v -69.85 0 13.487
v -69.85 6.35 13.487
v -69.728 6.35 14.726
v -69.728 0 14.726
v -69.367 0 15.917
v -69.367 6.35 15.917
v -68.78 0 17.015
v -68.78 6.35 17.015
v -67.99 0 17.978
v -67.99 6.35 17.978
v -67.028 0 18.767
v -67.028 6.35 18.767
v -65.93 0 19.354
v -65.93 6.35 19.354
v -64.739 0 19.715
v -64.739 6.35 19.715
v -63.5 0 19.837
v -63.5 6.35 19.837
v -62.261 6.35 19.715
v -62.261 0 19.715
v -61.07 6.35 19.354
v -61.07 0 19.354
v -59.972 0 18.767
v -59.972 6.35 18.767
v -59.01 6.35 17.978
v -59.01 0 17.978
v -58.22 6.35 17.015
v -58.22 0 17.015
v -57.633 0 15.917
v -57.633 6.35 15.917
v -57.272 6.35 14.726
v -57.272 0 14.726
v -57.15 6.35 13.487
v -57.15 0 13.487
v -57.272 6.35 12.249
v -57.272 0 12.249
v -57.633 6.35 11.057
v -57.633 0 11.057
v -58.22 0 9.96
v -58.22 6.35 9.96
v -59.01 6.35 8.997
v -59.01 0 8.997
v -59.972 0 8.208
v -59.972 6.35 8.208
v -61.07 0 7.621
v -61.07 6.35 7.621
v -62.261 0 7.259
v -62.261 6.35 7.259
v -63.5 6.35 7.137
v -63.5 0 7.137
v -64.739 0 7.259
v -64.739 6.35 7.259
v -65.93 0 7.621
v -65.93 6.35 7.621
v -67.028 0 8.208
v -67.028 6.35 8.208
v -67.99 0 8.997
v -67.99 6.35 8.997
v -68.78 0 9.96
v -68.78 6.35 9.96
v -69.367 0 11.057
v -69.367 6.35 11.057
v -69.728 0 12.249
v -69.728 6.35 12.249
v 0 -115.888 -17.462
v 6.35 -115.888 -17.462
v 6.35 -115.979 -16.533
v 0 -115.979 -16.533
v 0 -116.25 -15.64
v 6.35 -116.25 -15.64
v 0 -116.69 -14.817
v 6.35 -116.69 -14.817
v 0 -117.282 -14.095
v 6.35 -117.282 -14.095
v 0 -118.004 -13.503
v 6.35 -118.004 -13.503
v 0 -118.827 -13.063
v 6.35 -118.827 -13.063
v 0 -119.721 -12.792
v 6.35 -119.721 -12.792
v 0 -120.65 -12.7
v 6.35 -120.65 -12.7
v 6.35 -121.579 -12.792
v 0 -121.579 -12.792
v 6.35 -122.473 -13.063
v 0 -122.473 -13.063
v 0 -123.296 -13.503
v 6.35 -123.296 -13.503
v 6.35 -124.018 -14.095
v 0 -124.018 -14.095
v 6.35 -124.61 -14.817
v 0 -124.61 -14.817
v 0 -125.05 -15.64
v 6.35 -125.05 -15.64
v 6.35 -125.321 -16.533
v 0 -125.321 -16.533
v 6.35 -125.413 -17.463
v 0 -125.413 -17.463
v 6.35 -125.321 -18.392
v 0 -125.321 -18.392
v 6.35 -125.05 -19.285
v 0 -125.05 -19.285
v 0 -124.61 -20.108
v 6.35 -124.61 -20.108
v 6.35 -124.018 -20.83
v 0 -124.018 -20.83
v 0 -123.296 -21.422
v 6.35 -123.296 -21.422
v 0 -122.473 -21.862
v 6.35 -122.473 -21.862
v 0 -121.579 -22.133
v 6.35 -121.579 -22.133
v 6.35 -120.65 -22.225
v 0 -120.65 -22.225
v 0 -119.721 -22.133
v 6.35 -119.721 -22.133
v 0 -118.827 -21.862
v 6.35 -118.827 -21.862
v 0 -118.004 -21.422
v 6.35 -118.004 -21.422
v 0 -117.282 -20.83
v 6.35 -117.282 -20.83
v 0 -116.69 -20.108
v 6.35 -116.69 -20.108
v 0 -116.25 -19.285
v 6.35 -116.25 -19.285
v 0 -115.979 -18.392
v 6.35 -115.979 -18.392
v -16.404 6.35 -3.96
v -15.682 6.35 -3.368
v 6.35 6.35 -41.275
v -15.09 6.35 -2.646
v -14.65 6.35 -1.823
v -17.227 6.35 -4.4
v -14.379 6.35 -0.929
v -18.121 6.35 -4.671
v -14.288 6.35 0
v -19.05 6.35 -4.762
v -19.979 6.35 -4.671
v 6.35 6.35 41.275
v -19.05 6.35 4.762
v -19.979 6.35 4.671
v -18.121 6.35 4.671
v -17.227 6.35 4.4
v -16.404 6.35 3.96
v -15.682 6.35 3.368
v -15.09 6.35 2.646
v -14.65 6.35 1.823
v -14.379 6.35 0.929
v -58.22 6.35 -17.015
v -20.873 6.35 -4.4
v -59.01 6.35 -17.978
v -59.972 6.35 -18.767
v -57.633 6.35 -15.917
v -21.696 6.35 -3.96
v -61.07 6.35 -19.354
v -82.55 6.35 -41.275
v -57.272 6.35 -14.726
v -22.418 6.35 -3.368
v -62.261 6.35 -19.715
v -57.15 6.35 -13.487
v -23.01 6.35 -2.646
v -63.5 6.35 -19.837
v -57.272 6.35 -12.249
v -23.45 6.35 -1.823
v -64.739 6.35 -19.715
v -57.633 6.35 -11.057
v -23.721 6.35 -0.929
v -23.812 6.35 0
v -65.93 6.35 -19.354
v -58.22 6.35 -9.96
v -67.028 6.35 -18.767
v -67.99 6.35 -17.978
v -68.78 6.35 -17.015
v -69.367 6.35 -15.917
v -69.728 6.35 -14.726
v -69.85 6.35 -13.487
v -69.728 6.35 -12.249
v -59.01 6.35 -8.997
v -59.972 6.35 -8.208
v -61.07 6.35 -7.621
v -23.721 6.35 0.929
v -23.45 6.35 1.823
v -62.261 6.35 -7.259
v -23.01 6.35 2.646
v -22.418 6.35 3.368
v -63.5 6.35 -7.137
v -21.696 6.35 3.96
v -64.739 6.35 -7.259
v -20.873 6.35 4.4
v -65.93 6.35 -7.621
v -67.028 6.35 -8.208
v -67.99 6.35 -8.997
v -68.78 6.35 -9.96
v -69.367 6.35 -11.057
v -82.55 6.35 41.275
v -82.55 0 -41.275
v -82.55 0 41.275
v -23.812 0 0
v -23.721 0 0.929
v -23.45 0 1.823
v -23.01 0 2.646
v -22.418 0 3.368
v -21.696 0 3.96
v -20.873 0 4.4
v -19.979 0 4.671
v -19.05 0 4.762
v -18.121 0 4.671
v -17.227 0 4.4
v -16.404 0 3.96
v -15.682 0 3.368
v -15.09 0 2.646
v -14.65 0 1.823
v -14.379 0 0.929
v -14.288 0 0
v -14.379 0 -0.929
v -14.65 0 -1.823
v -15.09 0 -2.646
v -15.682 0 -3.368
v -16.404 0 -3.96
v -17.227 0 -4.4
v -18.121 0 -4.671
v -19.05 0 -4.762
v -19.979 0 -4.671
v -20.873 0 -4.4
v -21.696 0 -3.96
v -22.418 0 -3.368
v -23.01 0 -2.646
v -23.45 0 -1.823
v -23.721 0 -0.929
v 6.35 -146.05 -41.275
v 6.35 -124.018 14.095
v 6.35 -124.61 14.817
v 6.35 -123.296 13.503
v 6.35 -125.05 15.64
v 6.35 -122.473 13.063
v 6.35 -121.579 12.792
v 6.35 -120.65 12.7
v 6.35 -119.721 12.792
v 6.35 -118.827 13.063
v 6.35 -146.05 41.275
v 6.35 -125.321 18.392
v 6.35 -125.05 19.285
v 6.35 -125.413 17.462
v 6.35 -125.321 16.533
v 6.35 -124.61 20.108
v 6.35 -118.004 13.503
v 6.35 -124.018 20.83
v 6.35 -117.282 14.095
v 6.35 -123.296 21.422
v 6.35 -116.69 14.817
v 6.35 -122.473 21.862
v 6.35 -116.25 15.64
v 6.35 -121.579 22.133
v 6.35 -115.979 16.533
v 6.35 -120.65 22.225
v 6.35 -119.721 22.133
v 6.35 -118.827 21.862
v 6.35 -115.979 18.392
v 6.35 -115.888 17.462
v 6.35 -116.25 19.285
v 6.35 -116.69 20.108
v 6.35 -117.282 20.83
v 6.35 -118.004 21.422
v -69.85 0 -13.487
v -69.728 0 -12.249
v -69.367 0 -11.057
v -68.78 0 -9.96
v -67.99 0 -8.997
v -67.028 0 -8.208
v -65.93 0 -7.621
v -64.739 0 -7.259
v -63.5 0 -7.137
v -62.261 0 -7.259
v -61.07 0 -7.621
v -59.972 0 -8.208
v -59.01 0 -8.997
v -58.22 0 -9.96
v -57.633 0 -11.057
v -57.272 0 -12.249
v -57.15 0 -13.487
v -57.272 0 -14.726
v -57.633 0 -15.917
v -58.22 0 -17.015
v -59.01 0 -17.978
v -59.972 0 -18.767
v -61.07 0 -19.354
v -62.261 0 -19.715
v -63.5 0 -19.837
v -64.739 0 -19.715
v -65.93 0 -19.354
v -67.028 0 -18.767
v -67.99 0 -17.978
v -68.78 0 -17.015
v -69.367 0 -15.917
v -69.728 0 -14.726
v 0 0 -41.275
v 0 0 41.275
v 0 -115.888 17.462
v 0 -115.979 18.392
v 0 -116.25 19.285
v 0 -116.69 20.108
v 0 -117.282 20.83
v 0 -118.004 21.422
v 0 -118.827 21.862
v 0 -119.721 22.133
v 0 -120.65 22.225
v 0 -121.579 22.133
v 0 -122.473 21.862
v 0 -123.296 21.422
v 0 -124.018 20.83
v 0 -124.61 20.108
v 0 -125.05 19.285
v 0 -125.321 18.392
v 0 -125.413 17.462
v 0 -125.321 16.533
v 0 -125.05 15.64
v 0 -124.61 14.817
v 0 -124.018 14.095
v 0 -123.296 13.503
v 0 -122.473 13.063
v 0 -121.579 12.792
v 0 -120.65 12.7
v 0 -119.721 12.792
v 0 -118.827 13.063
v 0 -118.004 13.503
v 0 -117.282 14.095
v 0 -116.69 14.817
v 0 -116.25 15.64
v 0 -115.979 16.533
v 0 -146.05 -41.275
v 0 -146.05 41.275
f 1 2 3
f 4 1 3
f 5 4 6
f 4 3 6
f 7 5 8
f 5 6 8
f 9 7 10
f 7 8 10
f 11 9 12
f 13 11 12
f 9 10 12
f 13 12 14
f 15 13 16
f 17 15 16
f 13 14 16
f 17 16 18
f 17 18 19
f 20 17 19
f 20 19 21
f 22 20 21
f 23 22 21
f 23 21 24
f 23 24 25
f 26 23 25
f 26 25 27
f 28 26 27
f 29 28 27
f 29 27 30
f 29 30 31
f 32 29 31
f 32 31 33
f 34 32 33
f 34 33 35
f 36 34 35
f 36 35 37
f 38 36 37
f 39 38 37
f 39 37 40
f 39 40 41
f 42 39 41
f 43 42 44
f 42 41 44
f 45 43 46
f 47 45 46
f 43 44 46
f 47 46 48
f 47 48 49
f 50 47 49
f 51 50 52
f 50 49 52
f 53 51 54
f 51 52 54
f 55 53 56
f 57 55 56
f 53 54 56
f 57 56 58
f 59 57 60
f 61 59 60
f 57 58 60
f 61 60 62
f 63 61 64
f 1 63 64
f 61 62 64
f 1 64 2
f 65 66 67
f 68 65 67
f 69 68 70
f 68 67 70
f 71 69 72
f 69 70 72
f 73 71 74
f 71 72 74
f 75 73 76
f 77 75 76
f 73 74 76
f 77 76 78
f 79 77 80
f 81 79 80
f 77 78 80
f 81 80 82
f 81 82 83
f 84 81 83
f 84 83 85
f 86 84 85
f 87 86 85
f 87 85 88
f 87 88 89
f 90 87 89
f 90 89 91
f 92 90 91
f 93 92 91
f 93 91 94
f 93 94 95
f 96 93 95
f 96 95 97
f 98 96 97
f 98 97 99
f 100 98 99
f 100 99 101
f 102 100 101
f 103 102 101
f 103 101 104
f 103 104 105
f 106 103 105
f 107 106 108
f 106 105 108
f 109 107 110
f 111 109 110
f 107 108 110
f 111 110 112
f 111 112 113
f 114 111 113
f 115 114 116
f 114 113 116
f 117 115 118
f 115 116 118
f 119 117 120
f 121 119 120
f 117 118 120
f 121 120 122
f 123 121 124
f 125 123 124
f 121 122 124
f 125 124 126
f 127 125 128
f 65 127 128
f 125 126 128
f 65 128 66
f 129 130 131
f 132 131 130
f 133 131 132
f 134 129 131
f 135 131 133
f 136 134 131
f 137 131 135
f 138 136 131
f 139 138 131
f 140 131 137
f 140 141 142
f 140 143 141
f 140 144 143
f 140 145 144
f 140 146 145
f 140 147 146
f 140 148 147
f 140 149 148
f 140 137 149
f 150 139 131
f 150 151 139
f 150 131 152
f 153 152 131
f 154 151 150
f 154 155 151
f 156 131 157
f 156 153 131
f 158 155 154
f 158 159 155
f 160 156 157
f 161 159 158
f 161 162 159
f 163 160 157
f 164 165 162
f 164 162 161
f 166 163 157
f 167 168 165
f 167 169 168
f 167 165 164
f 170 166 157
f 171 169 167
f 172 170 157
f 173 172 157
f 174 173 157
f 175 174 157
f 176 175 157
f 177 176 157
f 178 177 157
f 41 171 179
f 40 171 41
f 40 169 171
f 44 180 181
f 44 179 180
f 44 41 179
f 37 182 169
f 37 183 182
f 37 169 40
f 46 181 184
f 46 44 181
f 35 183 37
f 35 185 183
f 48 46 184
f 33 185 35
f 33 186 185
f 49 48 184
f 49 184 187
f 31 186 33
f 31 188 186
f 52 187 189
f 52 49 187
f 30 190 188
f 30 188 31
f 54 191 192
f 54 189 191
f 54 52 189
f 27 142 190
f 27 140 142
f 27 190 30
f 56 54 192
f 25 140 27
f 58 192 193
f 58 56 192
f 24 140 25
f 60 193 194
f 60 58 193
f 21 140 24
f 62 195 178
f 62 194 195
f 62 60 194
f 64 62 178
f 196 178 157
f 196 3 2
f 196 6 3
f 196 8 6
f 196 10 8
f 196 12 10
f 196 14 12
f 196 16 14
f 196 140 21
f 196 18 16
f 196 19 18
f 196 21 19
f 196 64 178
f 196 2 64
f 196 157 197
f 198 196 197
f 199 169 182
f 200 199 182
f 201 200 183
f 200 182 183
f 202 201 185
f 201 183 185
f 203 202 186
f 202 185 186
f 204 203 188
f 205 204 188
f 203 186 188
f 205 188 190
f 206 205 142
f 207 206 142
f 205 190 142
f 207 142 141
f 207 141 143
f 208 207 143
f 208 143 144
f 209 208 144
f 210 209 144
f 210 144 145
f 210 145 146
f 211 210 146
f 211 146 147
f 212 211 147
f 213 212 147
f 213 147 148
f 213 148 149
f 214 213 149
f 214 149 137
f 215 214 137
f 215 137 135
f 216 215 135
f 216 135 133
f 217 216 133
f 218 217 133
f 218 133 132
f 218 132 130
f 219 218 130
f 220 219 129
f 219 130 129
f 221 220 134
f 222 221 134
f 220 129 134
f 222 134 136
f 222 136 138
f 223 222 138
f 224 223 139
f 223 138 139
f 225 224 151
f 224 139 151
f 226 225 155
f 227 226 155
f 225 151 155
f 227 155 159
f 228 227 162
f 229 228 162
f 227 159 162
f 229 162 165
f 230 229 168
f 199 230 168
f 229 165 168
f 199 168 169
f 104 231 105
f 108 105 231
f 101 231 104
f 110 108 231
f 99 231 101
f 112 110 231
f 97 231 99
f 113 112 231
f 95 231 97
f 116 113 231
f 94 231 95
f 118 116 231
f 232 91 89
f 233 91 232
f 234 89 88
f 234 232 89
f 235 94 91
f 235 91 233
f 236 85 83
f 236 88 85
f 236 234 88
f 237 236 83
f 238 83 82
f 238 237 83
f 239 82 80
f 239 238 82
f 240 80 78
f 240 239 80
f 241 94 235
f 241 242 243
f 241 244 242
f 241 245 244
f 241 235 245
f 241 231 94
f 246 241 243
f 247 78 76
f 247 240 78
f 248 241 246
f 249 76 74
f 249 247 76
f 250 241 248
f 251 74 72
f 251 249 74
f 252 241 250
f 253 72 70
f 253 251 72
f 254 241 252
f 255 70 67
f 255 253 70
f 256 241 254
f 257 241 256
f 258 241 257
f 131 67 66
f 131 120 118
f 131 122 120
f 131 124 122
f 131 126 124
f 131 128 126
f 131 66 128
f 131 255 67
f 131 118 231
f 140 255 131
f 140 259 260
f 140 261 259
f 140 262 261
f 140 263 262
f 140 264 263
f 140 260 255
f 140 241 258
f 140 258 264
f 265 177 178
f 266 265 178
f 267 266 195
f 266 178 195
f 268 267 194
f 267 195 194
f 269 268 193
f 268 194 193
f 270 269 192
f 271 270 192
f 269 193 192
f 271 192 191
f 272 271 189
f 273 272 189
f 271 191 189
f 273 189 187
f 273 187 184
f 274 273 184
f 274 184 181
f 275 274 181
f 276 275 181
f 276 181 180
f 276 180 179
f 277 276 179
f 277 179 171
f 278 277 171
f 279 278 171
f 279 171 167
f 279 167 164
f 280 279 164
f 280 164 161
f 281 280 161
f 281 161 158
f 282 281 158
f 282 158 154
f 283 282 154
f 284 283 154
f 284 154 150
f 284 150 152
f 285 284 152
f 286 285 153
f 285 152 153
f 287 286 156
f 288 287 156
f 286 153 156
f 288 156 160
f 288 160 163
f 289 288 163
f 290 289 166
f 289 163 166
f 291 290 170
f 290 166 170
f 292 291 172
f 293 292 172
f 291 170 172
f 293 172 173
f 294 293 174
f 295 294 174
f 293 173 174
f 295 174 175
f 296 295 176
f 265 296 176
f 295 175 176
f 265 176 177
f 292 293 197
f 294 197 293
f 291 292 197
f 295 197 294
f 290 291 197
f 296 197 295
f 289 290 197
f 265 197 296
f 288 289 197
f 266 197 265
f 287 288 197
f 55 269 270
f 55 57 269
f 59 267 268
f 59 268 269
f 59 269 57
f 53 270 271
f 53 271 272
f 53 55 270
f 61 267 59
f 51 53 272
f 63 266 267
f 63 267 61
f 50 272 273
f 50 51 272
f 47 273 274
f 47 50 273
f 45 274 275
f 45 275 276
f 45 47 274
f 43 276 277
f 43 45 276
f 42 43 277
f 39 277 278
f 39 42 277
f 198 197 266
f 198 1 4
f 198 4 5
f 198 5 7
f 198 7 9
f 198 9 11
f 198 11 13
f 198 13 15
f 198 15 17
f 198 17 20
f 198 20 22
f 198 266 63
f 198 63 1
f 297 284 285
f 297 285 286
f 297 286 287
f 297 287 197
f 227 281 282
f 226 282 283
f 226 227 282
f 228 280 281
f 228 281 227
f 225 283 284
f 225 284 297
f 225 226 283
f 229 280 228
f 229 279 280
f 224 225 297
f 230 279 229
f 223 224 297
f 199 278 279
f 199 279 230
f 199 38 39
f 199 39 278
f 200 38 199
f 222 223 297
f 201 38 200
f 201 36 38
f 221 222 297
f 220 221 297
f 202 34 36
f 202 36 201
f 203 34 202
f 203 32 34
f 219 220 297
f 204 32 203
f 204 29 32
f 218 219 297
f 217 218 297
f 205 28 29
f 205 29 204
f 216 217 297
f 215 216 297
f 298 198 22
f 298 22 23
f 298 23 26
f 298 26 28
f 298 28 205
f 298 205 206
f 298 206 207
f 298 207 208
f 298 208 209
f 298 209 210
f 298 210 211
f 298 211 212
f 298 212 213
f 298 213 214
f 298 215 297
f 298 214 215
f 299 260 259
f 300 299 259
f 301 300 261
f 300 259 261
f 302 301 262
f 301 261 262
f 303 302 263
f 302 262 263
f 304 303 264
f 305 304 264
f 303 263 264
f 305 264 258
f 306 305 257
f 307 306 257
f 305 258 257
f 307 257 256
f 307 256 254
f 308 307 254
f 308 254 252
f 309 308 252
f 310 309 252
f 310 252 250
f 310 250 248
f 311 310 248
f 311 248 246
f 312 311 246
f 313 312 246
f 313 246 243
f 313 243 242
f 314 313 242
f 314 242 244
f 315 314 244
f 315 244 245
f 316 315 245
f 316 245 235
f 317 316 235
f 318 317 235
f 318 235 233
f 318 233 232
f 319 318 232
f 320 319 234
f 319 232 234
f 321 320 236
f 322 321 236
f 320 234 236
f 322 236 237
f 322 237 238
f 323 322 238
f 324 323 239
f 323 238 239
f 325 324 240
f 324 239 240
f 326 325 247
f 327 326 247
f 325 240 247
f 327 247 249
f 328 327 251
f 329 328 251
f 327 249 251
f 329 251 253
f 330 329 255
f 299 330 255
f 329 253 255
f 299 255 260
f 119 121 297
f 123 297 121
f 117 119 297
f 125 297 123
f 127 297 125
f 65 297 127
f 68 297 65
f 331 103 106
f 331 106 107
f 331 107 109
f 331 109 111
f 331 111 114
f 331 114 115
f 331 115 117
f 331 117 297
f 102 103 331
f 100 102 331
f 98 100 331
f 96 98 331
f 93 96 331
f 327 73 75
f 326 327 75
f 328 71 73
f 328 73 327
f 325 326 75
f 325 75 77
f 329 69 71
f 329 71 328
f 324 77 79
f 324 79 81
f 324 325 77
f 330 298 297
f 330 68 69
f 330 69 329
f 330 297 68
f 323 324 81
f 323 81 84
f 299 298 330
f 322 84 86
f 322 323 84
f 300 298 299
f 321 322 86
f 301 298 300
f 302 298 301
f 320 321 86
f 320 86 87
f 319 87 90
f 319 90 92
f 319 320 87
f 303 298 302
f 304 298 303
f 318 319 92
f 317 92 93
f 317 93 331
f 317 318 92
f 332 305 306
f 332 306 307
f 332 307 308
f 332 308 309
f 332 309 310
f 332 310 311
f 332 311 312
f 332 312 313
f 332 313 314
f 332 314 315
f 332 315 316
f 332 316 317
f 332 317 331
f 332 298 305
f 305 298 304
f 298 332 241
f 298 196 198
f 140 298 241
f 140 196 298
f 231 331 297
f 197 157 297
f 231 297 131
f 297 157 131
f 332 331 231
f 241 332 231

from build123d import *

# Parameters (mm, degrees)
F1_DEPTH = 41.275
F2_R     = 4.7625
F3_DEPTH = 88.901
F4_R     = 6.35
F4_R_2   = 4.7625
F5_DEPTH = 152.401


with BuildPart() as f1:
    # F0 (on Top) → F1 (new body, symmetric)
    with BuildSketch(Plane.XY):
        Polygon((-82.55, 0), (0, 0), (0, -146.05), (6.35, -146.05), (6.35, 6.35), (-82.55, 6.35), align=None)
    extrude(amount=F1_DEPTH, both=True)

    # F2 (on face) → F3 (cut, through all)
    with BuildSketch(Plane.YZ.offset(6.35)):
        with Locations((-120.65, 17.4625)):
            Circle(F2_R)
        with Locations((-120.65, -17.4625)):
            Circle(F2_R)
    extrude(amount=-F3_DEPTH, mode=Mode.SUBTRACT)

    # F4 (on face) → F5 (cut, through all)
    with BuildSketch(Plane(origin=(0, 6.35, 0), x_dir=(-1, 0, 0), z_dir=(0, 1, 0))):
        with Locations((63.5, 13.4874)):
            Circle(F4_R)
        with Locations((63.5, -13.4874)):
            Circle(F4_R)
        with Locations((19.05, 0)):
            Circle(F4_R_2)
    extrude(amount=-F5_DEPTH, mode=Mode.SUBTRACT)


solid = f1.part
